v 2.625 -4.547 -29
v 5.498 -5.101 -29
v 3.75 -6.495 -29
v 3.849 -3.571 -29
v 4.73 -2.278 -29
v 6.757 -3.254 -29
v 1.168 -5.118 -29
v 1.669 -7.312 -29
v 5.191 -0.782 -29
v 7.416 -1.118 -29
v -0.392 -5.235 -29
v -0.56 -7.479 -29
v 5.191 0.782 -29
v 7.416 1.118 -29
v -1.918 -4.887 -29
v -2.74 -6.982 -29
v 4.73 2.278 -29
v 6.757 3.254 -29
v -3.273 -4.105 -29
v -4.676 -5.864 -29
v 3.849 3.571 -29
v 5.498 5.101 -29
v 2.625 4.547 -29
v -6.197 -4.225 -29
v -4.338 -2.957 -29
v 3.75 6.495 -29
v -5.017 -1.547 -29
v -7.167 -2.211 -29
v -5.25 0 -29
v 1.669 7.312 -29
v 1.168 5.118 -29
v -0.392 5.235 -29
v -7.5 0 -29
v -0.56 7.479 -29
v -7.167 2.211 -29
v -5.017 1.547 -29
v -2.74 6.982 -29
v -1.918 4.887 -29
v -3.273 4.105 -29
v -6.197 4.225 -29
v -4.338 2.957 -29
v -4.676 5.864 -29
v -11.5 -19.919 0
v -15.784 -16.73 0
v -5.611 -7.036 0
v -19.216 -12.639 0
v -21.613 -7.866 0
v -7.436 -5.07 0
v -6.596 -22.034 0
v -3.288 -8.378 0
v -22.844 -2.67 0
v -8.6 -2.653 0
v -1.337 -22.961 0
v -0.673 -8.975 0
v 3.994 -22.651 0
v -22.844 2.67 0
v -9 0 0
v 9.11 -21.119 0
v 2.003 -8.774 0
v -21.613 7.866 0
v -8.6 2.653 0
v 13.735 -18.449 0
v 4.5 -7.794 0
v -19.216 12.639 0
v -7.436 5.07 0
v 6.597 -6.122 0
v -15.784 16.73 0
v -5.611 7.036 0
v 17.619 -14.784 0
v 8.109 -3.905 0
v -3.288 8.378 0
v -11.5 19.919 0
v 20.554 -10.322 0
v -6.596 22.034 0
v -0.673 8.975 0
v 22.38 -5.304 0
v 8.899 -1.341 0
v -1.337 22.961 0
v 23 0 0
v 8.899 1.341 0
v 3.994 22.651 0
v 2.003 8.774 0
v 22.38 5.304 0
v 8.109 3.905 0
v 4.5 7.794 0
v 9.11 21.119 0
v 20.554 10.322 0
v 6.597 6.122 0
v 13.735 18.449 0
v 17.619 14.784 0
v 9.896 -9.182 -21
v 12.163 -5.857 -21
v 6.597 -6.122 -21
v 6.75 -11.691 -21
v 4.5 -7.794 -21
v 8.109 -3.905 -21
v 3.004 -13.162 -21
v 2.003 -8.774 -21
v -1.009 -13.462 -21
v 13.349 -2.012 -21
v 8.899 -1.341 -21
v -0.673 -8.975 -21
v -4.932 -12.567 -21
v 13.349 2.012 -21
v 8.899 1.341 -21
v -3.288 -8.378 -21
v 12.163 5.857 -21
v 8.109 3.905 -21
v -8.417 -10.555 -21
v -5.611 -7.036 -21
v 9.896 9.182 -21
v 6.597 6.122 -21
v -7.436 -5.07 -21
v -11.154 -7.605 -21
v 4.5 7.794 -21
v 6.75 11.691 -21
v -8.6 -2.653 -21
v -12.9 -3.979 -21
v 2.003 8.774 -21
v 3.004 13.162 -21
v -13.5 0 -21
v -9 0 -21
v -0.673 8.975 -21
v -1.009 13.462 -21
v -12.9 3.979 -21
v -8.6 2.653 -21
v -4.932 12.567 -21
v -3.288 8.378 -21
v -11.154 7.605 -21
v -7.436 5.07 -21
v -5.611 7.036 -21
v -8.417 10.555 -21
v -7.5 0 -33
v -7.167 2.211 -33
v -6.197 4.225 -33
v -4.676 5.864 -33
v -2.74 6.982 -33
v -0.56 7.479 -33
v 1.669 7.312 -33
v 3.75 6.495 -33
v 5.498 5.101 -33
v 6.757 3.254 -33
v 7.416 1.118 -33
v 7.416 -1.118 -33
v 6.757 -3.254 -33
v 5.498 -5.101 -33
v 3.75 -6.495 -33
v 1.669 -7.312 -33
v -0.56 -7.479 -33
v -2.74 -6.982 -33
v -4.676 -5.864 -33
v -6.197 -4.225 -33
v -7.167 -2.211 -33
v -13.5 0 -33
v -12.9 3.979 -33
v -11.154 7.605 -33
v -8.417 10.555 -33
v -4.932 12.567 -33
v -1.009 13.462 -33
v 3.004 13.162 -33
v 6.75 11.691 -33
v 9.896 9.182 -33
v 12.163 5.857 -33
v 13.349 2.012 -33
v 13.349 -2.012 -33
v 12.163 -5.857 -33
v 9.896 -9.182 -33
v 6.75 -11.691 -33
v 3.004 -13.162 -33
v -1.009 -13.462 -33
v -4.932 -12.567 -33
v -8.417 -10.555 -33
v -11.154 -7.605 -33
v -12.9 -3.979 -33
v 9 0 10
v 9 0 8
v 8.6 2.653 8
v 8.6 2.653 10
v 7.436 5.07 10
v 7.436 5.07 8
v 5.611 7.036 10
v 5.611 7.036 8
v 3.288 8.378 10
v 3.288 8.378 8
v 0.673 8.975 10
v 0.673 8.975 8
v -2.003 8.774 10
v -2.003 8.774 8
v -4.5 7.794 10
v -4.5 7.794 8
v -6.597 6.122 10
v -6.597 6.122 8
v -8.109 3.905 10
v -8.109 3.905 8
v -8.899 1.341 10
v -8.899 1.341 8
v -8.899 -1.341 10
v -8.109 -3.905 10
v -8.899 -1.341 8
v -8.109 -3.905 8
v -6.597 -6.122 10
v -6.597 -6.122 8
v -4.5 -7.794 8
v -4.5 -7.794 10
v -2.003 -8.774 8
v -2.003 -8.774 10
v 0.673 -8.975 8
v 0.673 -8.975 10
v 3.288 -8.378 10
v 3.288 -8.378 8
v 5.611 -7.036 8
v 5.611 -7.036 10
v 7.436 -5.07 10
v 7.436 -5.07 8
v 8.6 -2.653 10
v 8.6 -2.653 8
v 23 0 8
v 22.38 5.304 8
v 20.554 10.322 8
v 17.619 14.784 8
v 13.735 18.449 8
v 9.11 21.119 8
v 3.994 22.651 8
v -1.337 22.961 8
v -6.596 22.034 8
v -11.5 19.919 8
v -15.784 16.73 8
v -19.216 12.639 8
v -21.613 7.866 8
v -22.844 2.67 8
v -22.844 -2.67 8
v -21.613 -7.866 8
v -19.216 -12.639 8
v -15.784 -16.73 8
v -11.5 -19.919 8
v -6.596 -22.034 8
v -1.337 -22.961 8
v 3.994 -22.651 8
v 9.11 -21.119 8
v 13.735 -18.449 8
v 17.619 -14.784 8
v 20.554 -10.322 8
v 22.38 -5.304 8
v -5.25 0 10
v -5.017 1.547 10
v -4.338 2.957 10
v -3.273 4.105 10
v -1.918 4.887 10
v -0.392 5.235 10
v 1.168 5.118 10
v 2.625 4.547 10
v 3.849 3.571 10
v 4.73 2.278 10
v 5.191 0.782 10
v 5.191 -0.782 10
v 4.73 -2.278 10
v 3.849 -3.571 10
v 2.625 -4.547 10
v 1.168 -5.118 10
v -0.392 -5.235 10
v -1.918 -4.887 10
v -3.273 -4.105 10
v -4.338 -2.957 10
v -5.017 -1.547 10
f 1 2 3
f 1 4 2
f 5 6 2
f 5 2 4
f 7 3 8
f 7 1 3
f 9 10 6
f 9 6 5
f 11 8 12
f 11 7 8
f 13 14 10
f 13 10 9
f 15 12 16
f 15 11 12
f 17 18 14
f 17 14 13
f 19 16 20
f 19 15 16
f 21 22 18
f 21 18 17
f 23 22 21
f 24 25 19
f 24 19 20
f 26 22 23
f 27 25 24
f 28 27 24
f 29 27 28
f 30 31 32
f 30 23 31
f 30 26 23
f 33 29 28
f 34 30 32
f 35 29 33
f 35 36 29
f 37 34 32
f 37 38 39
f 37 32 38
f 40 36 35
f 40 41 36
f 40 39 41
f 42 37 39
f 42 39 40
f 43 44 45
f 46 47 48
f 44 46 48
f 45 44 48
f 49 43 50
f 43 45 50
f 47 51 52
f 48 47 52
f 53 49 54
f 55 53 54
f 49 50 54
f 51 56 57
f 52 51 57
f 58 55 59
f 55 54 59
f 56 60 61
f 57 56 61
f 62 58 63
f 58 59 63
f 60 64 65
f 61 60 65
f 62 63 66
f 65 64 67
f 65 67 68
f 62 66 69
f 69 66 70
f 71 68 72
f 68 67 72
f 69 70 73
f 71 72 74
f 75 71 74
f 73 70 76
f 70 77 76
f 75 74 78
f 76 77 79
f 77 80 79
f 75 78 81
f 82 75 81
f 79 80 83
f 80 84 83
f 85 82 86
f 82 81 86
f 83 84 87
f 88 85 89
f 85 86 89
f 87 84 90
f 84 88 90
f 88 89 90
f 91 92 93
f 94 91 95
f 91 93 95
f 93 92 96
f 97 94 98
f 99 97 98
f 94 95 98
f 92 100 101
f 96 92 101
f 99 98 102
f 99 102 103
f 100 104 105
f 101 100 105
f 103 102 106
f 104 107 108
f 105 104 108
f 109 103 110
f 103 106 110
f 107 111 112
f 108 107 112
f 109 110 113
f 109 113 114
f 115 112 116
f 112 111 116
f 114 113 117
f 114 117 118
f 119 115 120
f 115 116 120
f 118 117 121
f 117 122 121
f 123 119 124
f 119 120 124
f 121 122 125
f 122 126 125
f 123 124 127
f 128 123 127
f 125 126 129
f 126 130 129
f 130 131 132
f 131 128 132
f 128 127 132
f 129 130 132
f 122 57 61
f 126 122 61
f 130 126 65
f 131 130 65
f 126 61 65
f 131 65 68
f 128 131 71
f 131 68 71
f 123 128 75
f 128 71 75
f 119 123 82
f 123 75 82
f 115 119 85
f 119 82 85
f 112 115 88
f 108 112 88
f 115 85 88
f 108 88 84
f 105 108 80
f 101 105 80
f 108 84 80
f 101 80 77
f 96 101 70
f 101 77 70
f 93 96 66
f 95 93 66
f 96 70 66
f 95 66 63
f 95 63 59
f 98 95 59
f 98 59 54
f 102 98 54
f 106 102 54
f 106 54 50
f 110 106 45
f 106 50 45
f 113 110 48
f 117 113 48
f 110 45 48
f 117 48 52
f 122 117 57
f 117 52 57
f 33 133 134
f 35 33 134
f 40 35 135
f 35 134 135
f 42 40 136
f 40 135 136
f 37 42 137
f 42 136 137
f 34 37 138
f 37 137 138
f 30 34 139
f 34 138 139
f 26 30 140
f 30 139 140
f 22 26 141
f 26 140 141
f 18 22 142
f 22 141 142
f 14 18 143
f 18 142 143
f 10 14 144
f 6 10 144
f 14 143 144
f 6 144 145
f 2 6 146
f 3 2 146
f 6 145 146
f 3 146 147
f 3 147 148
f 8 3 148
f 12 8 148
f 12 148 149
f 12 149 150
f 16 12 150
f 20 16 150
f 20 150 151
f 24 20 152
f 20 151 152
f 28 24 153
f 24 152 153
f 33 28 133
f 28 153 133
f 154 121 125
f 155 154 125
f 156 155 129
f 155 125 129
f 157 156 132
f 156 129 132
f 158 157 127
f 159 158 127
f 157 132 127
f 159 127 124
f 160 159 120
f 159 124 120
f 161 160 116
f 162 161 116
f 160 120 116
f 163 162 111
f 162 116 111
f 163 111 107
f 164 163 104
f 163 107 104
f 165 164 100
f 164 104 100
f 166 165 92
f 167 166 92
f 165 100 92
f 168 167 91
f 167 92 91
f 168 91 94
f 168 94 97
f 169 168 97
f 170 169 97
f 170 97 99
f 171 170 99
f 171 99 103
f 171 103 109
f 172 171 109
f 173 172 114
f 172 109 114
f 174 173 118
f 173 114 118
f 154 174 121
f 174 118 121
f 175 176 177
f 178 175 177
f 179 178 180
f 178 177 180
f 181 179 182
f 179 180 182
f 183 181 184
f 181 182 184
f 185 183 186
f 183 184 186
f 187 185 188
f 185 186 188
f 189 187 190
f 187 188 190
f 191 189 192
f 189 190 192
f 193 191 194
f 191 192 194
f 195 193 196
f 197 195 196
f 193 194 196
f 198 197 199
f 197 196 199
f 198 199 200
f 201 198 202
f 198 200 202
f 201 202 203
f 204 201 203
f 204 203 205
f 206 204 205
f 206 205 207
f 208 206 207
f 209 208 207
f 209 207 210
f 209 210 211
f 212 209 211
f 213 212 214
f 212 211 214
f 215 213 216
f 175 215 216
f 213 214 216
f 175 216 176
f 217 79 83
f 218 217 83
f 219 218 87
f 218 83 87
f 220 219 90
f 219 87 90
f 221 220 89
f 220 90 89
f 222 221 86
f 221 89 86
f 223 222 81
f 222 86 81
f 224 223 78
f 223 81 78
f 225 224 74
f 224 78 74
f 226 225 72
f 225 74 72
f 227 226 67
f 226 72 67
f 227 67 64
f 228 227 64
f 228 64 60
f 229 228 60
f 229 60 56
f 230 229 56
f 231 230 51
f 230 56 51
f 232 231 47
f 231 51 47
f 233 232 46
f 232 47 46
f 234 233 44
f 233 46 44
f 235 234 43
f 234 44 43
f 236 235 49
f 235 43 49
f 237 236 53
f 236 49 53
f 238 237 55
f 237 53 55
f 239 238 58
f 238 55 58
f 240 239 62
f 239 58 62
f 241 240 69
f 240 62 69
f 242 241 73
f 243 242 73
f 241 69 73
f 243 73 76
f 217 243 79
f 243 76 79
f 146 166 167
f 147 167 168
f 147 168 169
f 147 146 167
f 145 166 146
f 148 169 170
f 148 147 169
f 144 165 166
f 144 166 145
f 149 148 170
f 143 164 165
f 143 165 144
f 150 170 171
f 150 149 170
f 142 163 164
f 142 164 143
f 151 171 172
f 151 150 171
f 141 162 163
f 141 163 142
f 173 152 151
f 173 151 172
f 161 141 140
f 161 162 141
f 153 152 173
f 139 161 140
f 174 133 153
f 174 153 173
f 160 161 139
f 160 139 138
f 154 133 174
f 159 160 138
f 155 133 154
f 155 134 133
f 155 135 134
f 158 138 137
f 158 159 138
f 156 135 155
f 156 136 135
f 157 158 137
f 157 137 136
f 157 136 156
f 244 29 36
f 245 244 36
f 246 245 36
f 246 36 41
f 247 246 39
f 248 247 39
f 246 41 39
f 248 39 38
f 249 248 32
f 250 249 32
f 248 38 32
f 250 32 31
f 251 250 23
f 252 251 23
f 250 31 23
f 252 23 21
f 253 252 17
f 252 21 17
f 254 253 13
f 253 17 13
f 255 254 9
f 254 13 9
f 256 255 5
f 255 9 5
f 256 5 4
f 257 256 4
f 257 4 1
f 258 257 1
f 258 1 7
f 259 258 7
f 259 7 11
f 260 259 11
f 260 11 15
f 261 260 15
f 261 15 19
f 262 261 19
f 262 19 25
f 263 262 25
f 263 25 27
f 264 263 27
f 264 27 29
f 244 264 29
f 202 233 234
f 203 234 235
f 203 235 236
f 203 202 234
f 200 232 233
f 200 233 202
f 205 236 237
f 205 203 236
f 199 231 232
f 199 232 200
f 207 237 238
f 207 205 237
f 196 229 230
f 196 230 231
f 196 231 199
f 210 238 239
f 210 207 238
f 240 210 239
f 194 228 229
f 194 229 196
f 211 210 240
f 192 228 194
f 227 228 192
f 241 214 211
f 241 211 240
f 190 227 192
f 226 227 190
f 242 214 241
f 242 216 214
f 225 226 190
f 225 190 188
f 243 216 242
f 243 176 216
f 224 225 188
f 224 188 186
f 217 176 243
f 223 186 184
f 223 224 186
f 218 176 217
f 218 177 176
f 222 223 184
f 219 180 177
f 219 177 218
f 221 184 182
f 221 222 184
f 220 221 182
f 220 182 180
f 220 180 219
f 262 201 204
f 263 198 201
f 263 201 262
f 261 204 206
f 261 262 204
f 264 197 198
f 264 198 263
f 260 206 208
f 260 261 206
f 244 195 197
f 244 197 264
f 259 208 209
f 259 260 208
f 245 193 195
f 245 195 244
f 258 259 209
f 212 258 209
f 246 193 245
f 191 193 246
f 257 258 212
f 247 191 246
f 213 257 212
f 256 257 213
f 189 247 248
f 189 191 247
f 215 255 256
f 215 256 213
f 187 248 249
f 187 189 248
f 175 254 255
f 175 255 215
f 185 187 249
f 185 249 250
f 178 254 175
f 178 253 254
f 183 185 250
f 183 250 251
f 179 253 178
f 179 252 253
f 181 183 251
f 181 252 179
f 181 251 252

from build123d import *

# Parameters (mm, degrees)
SKETCH_1_R          = 23
EXTRUDE_1_DEPTH     = 8
SKETCH_2_R          = 9
EXTRUDE_2_DEPTH     = 2
SKETCH_3_R          = 9
EXTRUDE_3_DEPTH     = 21
SKETCH_4_R          = 13.5
EXTRUDE_4_DEPTH     = 12
SKETCH_5_R          = 7.5
CUT_EXTRUDE_1_DEPTH = 4
SKETCH_6_R          = 5.25
CUT_EXTRUDE_2_DEPTH = 100


with BuildPart() as part:
    # Эскиз1 → Бобышка-Вытянуть1 (new body)
    with BuildSketch(Plane.XY):
        Circle(SKETCH_1_R)
    extrude(amount=EXTRUDE_1_DEPTH)

    # Эскиз2 → Бобышка-Вытянуть2 (add)
    with BuildSketch(Plane.XY.offset(8)):
        Circle(SKETCH_2_R)
    extrude(amount=EXTRUDE_2_DEPTH)

    # Эскиз3 → Бобышка-Вытянуть3 (add)
    with BuildSketch(Plane(origin=(0, 0, 0), x_dir=(-1, 0, 0), z_dir=(0, 0, -1))):
        Circle(SKETCH_3_R)
    extrude(amount=EXTRUDE_3_DEPTH)

    # Эскиз4 → Бобышка-Вытянуть4 (add)
    with BuildSketch(Plane(origin=(0, 0, -21), x_dir=(-1, 0, 0), z_dir=(0, 0, -1))):
        Circle(SKETCH_4_R)
    extrude(amount=EXTRUDE_4_DEPTH)

    # Эскиз5 → Вырез-Вытянуть1 (cut)
    with BuildSketch(Plane(origin=(0, 0, -33), x_dir=(-1, 0, 0), z_dir=(0, 0, -1))):
        Circle(SKETCH_5_R)
    extrude(amount=-CUT_EXTRUDE_1_DEPTH, mode=Mode.SUBTRACT)

    # Эскиз6 → Вырез-Вытянуть2 (cut)
    with BuildSketch(Plane(origin=(0, 0, -29), x_dir=(-1, 0, 0), z_dir=(0, 0, -1))):
        Circle(SKETCH_6_R)
    extrude(amount=-CUT_EXTRUDE_2_DEPTH, mode=Mode.SUBTRACT)


solid = part.part
